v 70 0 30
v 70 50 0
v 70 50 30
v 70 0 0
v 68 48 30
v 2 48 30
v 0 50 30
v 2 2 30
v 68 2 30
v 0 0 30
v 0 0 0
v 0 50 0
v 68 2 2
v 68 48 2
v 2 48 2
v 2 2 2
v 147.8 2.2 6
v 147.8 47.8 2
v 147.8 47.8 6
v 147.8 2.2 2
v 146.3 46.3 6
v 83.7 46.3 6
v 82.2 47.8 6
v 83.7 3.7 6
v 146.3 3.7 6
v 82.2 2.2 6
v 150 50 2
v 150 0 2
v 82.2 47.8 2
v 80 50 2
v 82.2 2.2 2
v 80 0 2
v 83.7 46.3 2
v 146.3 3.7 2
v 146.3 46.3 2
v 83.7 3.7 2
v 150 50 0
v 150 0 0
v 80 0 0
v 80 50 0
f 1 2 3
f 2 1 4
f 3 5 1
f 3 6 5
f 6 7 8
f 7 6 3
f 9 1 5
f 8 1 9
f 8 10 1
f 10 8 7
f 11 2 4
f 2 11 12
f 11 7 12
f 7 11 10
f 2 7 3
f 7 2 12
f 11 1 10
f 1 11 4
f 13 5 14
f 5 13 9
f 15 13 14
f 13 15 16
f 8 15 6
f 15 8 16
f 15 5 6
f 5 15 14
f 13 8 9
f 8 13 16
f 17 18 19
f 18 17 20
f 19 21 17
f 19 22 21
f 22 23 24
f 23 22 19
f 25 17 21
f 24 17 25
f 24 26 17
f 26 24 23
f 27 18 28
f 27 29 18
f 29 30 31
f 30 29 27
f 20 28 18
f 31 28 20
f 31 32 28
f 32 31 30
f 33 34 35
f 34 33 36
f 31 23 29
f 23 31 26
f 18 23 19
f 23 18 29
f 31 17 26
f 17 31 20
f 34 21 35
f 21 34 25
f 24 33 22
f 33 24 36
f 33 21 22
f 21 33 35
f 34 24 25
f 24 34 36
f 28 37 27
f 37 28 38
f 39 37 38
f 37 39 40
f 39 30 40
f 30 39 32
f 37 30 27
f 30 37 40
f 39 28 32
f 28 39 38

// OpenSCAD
// Two-part electronics enclosure: Box and Lid
// Designed for FDM printing.

// --- Dimensions: Box ---
box_x = 70.0;      // Outer width (X)
box_y = 50.0;      // Outer depth (Y)
box_z = 30.0;      // Outer height (Z)
wall_t = 2.0;      // Wall thickness
floor_t = 2.0;     // Floor thickness

// --- Dimensions: Lid ---
lid_plate_x = 70.0; // Plate width (X)
lid_plate_y = 50.0; // Plate depth (Y)
lid_plate_z = 2.0;  // Plate thickness (Z)
lip_h = 4.0;        // Lip height
lip_t = 1.5;        // Lip wall thickness
lip_outer_x = 65.6; // Lip outer width (X)
lip_outer_y = 45.6; // Lip outer depth (Y)

// --- Spacing ---
gap = 10.0;         // Gap between parts on the print bed

$fn = 64;

// --- Part 1: The Box ---
// Positioned at the origin, sitting on Z=0
module box() {
    difference() {
        // Main outer body
        cube([box_x, box_y, box_z]);
        
        // Hollow interior
        translate([wall_t, wall_t, floor_t])
            cube([box_x - 2 * wall_t, box_y - 2 * wall_t, box_z]);
    }
}

// --- Part 2: The Lid ---
// Printed upside down (lid plate on bed, lip pointing up in -Z or flipped)
// User requested: "a plate 70x50x2 lying on the bed, with a rectangular lip on top of it"
// To print "upside down" so the lip is on the top surface of the plate, 
// we model the plate on the bed and the lip extending upwards.
module lid() {
    union() {
        // The base plate
        cube([lid_plate_x, lid_plate_y, lid_plate_z]);
        
        // The lip (centered on the plate)
        translate([
            (lid_plate_x - lip_outer_x) / 2, 
            (lid_plate_y - lip_outer_y) / 2, 
            lid_plate_z
        ])
        difference() {
            // Outer volume of lip
            cube([lip_outer_x, lip_outer_y, lip_h]);
            
            // Inner volume of lip (to create the wall)
            translate([lip_t, lip_t, -0.01])
                cube([lip_outer_x - 2 * lip_t, lip_outer_y - 2 * lip_t, lip_h + 0.02]);
        }
    }
}

// --- Assembly Layout ---

// Print the Box
translate([0, 0, 0]) 
    box();

// Print the Lid
// Placed on the +X side of the box with a 10mm gap
translate([box_x + gap, 0, 0]) 
    lid();
